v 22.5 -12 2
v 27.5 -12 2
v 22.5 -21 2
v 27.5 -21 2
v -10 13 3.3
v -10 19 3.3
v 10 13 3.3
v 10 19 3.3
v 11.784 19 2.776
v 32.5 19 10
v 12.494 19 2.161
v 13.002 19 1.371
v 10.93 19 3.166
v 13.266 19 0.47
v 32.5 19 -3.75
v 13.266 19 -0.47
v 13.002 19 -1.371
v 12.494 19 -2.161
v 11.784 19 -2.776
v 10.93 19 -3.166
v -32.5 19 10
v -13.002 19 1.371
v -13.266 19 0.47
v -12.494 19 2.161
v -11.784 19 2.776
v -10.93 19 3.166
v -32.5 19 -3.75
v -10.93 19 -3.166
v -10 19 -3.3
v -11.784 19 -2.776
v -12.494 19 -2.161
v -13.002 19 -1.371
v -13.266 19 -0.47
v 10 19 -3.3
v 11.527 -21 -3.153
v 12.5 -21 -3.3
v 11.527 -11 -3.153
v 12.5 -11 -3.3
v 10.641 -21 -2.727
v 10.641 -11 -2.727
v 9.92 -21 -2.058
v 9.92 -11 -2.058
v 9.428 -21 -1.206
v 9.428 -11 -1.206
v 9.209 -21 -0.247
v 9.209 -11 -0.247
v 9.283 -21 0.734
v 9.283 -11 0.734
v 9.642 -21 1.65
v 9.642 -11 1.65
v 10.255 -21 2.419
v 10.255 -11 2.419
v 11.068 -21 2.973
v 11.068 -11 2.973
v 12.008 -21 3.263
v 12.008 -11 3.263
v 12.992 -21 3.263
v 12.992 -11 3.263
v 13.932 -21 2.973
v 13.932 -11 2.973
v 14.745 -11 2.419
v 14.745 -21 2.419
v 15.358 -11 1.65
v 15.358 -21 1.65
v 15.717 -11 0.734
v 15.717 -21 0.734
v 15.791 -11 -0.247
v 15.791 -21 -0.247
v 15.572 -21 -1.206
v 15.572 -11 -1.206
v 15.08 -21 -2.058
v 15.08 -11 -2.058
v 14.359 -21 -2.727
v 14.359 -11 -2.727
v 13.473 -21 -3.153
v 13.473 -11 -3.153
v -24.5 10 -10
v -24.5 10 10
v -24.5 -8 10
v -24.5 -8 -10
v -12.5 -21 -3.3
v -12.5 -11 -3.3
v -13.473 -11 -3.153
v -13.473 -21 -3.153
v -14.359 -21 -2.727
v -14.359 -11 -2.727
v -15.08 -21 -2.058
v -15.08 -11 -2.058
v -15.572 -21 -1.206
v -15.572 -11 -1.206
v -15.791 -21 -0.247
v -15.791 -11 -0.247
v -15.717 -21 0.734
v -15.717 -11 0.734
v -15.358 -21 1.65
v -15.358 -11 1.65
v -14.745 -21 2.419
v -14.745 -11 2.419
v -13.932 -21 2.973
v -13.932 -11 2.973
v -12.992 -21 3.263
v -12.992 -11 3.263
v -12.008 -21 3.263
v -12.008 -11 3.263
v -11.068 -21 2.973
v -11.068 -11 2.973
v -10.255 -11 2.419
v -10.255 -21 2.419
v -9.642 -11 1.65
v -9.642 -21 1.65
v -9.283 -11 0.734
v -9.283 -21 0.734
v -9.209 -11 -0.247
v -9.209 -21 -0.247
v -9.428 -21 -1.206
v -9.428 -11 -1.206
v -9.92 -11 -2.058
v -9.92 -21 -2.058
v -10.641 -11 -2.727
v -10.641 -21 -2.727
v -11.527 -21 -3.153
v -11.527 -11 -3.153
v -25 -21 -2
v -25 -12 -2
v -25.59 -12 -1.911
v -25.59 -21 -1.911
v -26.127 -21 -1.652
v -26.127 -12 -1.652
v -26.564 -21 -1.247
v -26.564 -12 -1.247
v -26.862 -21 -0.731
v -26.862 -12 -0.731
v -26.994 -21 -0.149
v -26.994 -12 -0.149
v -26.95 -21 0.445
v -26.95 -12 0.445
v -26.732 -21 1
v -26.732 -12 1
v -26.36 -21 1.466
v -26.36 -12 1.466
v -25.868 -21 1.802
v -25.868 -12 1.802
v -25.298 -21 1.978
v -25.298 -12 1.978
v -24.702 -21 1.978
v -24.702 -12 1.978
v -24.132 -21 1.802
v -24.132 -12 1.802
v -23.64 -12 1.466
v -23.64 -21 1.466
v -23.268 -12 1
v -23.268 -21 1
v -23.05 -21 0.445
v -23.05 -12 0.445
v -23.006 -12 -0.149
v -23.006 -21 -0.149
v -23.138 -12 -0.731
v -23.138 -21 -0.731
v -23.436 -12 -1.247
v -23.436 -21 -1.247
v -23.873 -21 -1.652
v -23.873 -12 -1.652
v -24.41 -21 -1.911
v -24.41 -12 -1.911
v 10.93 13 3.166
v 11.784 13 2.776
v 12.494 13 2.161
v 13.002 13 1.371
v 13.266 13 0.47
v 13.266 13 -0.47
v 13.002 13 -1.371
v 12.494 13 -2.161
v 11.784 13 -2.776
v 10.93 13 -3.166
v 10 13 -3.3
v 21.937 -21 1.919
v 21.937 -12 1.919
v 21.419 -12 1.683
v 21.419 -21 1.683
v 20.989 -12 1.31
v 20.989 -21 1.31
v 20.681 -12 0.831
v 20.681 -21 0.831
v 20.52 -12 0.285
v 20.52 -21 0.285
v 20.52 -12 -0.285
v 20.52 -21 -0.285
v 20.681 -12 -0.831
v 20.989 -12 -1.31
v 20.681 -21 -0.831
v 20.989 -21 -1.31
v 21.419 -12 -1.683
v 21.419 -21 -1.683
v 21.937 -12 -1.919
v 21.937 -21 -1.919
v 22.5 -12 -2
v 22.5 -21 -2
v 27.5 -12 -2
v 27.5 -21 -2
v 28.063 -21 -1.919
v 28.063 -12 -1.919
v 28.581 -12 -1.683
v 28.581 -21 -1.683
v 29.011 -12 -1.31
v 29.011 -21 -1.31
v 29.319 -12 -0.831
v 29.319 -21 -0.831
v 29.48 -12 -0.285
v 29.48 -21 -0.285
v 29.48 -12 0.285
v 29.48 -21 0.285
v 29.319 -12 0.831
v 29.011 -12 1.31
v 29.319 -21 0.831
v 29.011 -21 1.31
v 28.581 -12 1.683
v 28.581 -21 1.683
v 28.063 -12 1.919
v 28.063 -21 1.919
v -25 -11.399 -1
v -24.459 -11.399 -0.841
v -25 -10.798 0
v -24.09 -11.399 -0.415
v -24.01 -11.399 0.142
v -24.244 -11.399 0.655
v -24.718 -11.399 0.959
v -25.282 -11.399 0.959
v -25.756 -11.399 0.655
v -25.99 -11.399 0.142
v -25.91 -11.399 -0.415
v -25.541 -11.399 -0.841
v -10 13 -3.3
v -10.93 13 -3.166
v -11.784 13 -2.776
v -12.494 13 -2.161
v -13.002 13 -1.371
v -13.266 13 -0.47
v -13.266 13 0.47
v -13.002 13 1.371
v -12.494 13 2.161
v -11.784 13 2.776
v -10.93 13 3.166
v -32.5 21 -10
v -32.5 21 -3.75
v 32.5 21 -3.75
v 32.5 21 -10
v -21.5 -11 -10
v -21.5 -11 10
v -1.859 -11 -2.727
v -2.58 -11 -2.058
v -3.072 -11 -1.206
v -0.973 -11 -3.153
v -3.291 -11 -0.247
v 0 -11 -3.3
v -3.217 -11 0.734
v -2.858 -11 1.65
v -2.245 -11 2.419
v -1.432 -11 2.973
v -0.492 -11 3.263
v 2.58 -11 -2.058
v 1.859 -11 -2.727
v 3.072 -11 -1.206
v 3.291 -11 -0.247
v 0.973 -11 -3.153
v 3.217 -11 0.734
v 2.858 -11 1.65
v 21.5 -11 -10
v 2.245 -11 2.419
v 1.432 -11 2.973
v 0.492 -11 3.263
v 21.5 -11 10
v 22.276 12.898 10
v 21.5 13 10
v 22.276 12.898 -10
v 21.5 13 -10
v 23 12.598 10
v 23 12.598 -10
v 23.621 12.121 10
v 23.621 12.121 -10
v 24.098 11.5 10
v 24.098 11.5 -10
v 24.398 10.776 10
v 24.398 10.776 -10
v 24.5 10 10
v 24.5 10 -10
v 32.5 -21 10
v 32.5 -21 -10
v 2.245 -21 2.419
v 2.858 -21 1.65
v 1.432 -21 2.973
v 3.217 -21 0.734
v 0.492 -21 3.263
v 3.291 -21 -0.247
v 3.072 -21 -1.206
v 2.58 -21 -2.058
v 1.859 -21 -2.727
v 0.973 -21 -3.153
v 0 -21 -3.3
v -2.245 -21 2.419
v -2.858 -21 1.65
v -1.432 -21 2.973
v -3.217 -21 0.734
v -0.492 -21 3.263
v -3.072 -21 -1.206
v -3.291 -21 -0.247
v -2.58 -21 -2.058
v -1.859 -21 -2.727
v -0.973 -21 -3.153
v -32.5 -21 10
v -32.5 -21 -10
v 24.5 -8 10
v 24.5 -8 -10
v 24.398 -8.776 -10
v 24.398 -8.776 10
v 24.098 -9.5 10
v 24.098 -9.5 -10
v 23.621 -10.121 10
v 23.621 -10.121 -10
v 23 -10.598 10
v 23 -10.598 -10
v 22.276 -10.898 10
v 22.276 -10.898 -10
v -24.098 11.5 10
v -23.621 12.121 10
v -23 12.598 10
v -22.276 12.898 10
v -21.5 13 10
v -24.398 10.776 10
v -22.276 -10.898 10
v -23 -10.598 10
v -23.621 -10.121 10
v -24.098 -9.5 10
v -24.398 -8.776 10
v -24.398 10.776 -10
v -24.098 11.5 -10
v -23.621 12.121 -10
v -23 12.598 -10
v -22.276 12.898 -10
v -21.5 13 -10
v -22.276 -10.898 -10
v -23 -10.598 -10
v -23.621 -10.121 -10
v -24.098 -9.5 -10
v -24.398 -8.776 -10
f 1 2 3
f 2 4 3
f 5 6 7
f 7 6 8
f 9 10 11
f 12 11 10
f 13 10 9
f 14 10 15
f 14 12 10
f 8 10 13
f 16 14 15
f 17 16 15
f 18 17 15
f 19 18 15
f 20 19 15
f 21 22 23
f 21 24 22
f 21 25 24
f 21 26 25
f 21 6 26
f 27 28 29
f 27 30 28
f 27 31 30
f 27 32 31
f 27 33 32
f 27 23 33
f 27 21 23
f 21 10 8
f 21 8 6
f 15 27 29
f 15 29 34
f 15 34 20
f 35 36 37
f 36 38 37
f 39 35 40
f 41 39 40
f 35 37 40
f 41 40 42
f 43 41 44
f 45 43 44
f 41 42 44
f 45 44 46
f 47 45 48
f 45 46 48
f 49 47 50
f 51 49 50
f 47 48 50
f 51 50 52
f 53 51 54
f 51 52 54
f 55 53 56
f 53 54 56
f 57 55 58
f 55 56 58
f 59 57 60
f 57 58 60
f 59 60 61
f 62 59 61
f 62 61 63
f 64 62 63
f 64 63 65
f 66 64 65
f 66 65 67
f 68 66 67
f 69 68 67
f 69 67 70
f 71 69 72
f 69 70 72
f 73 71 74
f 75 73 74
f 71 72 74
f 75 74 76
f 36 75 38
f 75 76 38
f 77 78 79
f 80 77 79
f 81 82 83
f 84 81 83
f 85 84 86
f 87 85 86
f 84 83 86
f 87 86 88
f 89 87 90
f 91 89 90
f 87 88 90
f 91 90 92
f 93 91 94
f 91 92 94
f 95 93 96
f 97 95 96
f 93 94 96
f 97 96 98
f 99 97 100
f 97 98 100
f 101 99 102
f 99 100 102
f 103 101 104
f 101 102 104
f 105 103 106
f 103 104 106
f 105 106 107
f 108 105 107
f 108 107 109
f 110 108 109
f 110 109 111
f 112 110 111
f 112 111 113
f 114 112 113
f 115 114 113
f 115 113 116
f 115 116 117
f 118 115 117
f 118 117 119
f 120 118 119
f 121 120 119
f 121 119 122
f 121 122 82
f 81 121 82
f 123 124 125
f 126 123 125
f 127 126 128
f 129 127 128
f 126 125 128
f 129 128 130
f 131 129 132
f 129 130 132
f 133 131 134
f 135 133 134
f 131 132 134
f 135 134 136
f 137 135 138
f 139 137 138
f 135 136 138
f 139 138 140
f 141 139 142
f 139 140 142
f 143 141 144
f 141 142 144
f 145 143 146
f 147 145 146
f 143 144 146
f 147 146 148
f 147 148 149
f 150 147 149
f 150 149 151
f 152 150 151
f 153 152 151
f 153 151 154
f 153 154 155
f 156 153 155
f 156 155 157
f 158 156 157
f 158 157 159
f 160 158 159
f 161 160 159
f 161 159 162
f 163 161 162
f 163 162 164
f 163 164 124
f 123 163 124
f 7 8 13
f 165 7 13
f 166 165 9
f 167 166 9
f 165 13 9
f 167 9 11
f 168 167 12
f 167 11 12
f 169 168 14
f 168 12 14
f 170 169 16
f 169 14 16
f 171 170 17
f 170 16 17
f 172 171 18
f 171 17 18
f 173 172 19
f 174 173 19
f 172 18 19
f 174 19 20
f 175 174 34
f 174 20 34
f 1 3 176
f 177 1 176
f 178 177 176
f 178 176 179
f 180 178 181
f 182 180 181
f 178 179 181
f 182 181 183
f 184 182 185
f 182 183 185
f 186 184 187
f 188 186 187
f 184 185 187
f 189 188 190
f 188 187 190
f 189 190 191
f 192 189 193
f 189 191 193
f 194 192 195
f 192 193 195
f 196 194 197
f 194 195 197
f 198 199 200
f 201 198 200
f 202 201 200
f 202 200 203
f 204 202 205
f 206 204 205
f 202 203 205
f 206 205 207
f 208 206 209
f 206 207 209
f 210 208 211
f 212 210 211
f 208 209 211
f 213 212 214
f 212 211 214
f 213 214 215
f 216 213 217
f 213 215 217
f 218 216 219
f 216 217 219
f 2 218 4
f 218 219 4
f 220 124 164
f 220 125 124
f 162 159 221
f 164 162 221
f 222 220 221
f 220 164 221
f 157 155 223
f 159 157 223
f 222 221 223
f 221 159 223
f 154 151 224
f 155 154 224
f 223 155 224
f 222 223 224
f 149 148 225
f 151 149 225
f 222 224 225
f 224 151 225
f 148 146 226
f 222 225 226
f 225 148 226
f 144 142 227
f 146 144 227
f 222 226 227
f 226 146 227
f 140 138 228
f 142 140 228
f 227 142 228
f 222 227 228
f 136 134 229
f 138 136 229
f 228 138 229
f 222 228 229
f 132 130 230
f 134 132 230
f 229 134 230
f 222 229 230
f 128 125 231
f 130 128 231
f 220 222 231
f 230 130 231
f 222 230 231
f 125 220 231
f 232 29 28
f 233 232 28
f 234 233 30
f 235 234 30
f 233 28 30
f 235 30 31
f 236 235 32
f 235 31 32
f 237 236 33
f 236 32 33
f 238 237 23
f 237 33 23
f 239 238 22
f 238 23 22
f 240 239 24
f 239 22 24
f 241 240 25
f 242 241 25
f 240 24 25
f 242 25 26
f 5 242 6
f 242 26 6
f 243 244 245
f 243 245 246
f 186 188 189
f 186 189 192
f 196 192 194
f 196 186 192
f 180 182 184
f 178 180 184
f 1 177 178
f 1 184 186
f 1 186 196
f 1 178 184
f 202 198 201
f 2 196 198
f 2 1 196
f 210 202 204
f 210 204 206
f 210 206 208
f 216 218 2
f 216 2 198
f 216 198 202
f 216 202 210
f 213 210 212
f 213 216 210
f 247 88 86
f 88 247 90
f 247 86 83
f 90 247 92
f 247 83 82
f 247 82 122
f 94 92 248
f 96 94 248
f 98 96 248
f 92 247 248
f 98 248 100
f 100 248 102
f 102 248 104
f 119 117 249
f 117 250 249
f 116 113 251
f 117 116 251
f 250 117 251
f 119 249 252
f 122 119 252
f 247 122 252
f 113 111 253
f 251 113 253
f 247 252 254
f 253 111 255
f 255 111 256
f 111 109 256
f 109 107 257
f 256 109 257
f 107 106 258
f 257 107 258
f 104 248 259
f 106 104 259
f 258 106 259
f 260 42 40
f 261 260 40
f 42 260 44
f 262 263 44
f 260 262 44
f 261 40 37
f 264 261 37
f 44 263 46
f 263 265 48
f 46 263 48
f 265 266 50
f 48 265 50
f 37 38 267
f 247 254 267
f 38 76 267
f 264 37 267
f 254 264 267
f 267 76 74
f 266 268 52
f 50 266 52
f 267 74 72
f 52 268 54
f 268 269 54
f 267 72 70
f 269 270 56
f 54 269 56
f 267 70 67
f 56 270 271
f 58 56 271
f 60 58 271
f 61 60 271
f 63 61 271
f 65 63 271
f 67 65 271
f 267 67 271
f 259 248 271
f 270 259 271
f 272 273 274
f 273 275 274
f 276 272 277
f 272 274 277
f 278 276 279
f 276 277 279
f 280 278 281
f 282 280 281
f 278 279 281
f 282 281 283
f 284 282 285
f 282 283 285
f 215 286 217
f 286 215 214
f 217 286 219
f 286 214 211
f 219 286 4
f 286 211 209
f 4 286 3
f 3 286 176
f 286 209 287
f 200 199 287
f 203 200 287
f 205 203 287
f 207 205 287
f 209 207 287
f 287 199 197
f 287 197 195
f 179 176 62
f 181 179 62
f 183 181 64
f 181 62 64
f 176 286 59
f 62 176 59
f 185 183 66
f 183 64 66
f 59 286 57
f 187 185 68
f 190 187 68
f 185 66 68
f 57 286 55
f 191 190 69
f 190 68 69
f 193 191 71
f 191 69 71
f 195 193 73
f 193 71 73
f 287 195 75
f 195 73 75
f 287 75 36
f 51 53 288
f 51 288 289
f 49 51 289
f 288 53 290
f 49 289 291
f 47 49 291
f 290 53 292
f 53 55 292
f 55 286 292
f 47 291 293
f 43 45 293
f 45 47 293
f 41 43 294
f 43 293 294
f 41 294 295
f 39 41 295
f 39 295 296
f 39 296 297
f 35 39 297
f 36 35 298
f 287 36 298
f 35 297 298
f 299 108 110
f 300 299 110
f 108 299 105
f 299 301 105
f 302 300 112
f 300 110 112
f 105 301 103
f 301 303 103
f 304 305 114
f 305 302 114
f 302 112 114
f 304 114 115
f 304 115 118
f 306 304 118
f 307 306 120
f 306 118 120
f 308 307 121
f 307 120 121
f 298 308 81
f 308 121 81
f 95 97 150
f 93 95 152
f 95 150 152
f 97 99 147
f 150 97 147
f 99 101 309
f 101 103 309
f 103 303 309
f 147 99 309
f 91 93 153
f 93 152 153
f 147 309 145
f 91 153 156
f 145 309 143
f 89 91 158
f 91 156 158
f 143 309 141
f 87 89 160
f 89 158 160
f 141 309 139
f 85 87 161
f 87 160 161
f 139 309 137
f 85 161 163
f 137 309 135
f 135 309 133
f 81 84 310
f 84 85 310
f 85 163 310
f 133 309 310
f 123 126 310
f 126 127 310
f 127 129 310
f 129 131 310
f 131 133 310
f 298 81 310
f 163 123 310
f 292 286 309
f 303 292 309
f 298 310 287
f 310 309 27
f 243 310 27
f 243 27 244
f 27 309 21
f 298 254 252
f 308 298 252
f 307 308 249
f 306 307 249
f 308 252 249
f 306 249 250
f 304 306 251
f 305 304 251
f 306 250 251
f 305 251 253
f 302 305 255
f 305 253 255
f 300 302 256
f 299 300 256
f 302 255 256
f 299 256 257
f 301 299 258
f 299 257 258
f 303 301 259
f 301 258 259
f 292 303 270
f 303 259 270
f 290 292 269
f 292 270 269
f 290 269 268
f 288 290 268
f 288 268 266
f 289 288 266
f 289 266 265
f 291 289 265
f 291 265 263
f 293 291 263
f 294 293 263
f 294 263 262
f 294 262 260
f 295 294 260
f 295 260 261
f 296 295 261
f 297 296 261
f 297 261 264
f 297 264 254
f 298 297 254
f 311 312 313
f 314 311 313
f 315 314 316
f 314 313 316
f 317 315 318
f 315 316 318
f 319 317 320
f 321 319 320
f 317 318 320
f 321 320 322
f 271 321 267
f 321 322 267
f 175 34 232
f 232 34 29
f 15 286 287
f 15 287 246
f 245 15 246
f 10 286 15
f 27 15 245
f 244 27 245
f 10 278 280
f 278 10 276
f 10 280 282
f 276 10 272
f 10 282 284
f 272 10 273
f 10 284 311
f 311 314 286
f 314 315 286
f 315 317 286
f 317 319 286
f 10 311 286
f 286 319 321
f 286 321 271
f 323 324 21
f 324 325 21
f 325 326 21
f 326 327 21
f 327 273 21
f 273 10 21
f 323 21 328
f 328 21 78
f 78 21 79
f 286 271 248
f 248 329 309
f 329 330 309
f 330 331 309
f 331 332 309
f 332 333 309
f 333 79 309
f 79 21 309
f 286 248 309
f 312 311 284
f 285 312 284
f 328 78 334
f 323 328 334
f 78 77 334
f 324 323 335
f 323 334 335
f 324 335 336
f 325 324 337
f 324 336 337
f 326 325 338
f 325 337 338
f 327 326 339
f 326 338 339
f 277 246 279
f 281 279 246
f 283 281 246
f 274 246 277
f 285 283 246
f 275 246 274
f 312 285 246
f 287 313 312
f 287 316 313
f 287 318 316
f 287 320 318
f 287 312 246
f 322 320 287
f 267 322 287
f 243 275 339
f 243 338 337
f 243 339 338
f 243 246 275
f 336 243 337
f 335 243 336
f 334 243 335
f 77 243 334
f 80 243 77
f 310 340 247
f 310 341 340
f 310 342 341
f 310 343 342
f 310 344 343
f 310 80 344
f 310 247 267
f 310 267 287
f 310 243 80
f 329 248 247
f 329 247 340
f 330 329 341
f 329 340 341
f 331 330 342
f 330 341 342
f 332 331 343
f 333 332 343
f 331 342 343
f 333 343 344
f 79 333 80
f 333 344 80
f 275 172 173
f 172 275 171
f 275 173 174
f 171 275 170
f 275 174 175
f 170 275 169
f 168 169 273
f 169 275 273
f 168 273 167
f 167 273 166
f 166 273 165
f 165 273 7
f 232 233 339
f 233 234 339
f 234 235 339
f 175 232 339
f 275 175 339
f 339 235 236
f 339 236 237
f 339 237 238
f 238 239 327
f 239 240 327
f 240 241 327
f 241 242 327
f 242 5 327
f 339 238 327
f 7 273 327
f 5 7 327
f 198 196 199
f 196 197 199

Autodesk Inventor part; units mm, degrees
ref_plane "XZ Plane" through (0, 0, 0) normal (0, 1, 0) x (-1, 0, 0)
ref_plane "XY Plane" through (0, 0, 0) normal (0, 0, 1) x (1, 0, 0)
ref_plane "Work Plane1" through (-32.5, 0, 0) normal (1, 0, 0) x (0, 1, 0)
sketch "Sketch1" plane through (-32.5, 0, 0) normal (1, 0, 0) x (0, 1, 0)
  line L0 (-21, 10) -> (-21, -10)
  line L1 (19, -3.75) -> (21, -3.75)
  line L2 (21, -10) -> (-21, -10)
  line L3 (19, 10) -> (19, -3.75)
  line L4 (19, 10) -> (-21, 10)
  line L5 (21, -3.75) -> (21, -10)
extrude "Extrusion4" add sketch "Sketch1" along normal blind 65
sketch "Sketch2" plane through (-32.5, -21, 10) normal (0, 0, 1) x (1, 0, 0)
  line L0 (57, 10) -> (57, 34)
  line L1 (57, 34) -> (8, 34)
  line L2 (8, 34) -> (8, 10)
  line L3 (8, 10) -> (57, 10)
extrude "Extrusion3" cut sketch "Sketch2" against normal blind 20
sketch "Sketch3" plane through (-32.5, 19, 10) normal (0, 1, 0) x (1, 0, 0)
  line L0 (42.5, 13.3) -> (22.5, 13.3)
  arc A0 (22.5, 13.3) -> (22.5, 6.7) centre (22.5, 10) ccw
  arc A1 (42.5, 6.7) -> (42.5, 13.3) centre (42.5, 10) ccw
  line L1 (22.5, 6.7) -> (42.5, 6.7)
extrude "Extrusion2" cut sketch "Sketch3" against normal blind 6
fillet "Fillet4" radius 3 1 edges at (24.5, 13, 0)
fillet "Fillet3" radius 3 1 edges at (24.5, -11, 0)
fillet "Fillet2" radius 3 1 edges at (-24.5, -11, 0)
fillet "Fillet1" radius 3 1 edges at (-24.5, 13, 0)
sketch "Sketch7" plane through (-32.5, -21, -10) normal (0, -1, 0) x (1, 0, 0)
  line L0 (45, 10) -> (20, 10)
  line L1 (11, 20) -> (54, 20) construction
  line L2 (32.5, 20) -> (32.5, 0) construction
  line L3 (0, 0) -> (65, 0) construction
  point P0 (32.5, 10)
  point P1 (32.5, 10)
  dimension "d41" = 25
hole "M6CLR" at (0, -21, 0) at (-12.5, -21, 0) at (12.5, -21, 0) direction (0, 1, 0) diameter 6.6 depth 10 clearance for "Countersunk Flat Head Screw ISO 2009/7046" size "M6" standard "ISO"
sketch "Sketch5" plane through (-32.5, -21, -10) normal (0, -1, 0) x (1, 0, 0)
  point P0 (7.5, 10)
hole "4H7" at (-25, -21, 0) direction (0, 1, 0) diameter 4 depth 9 tip angle 118
sketch "Sketch4" plane through (-32.5, -21, -10) normal (0, -1, 0) x (1, 0, 0)
  arc A0 (60, 8) -> (60, 12) centre (60, 10) ccw
  line L0 (55, 8) -> (60, 8)
  line L1 (60, 12) -> (55, 12)
  arc A1 (55, 12) -> (55, 8) centre (55, 10) ccw
  dimension "d42" = 4
  dimension "d43" = 5
extrude "Extrusion1" cut sketch "Sketch4" against normal blind 9
properties part number "ASF-10003"
